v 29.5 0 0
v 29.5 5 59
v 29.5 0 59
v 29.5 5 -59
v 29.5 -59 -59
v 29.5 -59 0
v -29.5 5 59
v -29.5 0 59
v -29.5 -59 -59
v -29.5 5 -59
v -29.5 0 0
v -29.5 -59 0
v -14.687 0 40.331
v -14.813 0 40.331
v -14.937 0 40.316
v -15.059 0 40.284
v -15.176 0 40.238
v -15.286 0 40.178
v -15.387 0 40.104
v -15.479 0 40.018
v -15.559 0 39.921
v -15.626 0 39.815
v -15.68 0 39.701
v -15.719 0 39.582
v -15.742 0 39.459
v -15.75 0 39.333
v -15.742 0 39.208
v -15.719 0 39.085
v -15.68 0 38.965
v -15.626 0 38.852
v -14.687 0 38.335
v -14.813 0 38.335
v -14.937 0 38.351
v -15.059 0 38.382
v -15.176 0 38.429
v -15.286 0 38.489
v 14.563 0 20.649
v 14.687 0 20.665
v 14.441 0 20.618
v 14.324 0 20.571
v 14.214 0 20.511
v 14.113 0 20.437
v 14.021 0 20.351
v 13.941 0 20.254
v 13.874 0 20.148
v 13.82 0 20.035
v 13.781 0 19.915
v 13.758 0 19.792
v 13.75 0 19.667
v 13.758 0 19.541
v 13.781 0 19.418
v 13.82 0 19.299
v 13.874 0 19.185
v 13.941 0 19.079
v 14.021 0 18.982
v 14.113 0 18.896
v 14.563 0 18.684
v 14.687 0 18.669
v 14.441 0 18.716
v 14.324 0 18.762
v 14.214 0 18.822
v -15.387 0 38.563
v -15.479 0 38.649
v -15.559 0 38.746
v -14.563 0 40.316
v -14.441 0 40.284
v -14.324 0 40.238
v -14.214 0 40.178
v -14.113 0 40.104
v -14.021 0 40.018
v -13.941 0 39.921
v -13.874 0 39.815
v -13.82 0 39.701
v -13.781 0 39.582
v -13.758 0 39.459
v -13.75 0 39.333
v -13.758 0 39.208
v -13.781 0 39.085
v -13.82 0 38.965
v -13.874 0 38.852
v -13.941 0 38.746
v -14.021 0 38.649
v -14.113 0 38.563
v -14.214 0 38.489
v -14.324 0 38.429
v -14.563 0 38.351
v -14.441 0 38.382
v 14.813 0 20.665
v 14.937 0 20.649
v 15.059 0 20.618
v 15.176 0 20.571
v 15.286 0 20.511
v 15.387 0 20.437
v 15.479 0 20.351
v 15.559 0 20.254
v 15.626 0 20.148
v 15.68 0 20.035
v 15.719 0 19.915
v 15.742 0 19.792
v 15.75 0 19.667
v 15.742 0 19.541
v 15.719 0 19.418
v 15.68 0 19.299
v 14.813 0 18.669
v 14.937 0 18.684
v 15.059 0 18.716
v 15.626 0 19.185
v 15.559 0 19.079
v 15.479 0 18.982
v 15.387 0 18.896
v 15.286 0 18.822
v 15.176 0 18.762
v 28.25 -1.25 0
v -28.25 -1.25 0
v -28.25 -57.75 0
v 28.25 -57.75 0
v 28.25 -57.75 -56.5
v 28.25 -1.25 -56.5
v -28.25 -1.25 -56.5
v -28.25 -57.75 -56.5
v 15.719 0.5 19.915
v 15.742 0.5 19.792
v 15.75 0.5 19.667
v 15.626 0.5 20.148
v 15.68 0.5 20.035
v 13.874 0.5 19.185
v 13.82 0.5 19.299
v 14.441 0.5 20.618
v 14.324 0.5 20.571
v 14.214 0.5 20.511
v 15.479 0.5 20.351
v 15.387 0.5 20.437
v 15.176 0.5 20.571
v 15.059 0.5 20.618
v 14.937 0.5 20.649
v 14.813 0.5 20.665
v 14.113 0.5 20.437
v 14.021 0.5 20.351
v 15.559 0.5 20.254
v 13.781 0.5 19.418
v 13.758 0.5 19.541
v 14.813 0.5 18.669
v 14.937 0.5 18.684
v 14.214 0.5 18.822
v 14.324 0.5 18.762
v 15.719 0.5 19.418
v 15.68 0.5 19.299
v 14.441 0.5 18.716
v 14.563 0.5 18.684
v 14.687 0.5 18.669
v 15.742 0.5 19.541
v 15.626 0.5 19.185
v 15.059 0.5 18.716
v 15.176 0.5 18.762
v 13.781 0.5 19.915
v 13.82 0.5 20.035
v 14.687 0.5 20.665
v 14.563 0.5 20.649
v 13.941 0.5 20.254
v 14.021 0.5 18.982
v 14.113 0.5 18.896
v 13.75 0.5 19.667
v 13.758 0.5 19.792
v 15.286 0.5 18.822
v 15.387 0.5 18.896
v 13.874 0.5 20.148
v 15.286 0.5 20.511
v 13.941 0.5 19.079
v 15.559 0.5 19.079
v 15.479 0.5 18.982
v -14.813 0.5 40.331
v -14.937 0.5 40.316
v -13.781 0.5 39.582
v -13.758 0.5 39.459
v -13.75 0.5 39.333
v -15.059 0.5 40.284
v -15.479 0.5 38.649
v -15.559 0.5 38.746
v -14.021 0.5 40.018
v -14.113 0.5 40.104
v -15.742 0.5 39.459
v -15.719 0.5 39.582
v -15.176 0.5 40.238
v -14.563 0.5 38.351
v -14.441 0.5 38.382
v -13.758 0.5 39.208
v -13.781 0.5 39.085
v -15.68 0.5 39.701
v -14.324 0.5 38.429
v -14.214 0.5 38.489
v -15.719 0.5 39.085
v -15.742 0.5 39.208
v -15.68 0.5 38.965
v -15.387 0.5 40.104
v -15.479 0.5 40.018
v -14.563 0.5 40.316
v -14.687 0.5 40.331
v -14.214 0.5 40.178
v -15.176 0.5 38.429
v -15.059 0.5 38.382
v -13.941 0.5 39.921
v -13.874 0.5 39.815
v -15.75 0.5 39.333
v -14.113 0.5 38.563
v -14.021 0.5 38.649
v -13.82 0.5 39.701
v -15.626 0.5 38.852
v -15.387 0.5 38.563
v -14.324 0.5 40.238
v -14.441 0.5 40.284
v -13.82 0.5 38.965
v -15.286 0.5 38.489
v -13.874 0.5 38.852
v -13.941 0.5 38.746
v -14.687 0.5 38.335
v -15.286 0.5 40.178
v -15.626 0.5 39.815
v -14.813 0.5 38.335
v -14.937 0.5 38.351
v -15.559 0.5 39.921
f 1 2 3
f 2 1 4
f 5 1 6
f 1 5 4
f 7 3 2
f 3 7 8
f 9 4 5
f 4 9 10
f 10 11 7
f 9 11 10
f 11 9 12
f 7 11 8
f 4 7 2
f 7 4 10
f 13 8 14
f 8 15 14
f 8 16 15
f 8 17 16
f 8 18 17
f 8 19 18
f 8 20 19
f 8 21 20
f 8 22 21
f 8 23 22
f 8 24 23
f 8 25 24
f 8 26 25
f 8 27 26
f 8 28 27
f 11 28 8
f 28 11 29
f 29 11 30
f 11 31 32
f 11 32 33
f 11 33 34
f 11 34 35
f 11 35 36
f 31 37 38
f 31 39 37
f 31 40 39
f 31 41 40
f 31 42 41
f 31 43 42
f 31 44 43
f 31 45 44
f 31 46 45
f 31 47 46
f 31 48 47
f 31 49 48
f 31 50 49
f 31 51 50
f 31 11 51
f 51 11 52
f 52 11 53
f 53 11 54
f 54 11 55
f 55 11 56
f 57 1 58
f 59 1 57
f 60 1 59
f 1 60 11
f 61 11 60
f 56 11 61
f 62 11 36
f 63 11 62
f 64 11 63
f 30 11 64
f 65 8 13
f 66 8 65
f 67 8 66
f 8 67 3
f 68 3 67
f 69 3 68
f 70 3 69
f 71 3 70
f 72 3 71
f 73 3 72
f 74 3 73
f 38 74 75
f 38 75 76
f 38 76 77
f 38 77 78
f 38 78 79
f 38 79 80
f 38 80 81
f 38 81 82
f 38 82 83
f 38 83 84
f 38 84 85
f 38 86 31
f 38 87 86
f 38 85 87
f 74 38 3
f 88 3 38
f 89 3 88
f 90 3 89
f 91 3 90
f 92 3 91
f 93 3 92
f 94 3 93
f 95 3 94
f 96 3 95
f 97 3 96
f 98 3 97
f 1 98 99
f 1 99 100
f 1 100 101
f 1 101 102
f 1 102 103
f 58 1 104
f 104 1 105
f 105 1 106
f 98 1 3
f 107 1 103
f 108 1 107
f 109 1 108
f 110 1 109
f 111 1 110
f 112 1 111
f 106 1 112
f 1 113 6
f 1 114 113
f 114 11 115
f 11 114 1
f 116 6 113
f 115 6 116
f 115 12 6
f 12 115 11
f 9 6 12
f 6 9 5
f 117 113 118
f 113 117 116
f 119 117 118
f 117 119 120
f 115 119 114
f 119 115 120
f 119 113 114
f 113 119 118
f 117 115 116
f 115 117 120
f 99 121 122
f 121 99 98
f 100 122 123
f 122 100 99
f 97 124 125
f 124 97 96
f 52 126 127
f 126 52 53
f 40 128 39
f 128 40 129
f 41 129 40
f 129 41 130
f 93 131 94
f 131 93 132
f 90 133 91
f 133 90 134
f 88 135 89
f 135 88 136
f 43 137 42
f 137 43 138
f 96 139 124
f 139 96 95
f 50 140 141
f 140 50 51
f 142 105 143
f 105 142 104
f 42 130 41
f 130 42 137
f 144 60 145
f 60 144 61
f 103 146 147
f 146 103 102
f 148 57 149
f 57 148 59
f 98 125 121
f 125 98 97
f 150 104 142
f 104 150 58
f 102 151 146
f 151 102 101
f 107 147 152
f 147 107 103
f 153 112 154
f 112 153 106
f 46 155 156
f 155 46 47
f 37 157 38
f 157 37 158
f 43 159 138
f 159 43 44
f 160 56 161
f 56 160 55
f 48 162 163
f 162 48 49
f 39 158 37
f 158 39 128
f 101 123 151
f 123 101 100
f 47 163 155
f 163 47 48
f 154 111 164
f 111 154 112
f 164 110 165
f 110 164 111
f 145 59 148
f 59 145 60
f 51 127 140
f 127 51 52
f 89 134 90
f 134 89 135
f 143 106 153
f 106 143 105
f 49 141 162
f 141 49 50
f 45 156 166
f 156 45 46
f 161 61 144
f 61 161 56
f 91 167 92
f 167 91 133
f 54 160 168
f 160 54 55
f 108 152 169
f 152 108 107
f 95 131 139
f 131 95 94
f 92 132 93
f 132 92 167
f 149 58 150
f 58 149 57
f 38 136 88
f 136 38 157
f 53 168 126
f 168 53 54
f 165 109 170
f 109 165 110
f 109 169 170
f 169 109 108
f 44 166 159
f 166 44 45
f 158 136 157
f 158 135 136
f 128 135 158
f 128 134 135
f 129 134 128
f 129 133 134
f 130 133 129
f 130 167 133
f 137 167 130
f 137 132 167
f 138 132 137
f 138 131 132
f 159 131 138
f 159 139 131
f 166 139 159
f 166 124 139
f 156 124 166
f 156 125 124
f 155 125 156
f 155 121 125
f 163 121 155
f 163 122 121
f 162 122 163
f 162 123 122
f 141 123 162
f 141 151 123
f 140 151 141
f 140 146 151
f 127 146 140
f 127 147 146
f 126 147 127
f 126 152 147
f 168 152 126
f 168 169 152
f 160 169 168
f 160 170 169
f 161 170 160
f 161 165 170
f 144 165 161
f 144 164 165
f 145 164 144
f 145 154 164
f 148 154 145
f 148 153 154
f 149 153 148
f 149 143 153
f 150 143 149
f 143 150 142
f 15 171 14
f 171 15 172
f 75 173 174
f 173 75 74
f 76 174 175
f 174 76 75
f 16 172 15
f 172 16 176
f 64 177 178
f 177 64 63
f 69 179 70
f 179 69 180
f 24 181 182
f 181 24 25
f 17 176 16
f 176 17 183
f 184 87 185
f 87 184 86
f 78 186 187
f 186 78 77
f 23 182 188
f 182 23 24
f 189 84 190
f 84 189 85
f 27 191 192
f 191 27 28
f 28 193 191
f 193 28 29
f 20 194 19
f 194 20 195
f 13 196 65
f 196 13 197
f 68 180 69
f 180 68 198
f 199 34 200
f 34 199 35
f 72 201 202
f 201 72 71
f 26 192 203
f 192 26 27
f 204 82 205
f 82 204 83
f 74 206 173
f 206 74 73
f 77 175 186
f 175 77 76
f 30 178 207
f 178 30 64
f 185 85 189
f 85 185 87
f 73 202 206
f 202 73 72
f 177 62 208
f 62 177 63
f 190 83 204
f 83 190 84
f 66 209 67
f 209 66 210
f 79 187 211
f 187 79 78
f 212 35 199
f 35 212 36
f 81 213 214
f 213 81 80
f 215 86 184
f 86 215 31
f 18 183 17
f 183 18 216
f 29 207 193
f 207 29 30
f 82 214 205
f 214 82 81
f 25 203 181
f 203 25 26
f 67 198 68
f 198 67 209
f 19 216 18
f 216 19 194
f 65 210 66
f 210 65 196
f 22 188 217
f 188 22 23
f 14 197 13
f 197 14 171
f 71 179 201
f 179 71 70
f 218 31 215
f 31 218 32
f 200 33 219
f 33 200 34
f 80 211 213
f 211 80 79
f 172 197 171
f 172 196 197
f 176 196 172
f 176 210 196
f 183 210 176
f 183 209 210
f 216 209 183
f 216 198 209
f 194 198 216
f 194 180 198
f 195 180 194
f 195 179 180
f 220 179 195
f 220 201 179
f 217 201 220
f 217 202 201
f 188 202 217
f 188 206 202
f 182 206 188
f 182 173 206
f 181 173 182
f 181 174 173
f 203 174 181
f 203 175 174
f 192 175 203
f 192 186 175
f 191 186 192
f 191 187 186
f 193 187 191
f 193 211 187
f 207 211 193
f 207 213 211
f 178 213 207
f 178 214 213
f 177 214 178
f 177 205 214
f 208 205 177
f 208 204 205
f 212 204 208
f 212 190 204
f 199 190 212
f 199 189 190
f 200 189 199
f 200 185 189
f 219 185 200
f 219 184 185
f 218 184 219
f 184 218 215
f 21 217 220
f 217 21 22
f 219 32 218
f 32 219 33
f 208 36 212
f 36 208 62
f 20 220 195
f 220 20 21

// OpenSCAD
// Adjustable Tool Holder
// Units are mm

// Variables
w = 59;     //width of backplate
h = w*2;    //height of backplate
t = 5;      //thickness of backplate
d = 3;      //hole size

$fn = 50;

difference(){
    union(){
        //Backplate
        translate([0,t/2,0])
            cube([w,t,h],center=true);
            
        //Outter wall
        translate([0,-w/2,-w/2])
            cube([w,w,h/2],center=true);
    };    
        //Inner wall
        translate([0,-w/2,-w/2+t/2])
            cube([w-t/2,w-t/2,h/2],center=true);
    
        //mounting holes
        translate([w/4,0,h/6])rotate([90,0,0])
            cylinder([t*2,d/2,d/2],center=true);
        translate([-w/4,0,h/3])rotate([90,0,0])
            cylinder([t*2,d/2,d/2],center=true);
}
